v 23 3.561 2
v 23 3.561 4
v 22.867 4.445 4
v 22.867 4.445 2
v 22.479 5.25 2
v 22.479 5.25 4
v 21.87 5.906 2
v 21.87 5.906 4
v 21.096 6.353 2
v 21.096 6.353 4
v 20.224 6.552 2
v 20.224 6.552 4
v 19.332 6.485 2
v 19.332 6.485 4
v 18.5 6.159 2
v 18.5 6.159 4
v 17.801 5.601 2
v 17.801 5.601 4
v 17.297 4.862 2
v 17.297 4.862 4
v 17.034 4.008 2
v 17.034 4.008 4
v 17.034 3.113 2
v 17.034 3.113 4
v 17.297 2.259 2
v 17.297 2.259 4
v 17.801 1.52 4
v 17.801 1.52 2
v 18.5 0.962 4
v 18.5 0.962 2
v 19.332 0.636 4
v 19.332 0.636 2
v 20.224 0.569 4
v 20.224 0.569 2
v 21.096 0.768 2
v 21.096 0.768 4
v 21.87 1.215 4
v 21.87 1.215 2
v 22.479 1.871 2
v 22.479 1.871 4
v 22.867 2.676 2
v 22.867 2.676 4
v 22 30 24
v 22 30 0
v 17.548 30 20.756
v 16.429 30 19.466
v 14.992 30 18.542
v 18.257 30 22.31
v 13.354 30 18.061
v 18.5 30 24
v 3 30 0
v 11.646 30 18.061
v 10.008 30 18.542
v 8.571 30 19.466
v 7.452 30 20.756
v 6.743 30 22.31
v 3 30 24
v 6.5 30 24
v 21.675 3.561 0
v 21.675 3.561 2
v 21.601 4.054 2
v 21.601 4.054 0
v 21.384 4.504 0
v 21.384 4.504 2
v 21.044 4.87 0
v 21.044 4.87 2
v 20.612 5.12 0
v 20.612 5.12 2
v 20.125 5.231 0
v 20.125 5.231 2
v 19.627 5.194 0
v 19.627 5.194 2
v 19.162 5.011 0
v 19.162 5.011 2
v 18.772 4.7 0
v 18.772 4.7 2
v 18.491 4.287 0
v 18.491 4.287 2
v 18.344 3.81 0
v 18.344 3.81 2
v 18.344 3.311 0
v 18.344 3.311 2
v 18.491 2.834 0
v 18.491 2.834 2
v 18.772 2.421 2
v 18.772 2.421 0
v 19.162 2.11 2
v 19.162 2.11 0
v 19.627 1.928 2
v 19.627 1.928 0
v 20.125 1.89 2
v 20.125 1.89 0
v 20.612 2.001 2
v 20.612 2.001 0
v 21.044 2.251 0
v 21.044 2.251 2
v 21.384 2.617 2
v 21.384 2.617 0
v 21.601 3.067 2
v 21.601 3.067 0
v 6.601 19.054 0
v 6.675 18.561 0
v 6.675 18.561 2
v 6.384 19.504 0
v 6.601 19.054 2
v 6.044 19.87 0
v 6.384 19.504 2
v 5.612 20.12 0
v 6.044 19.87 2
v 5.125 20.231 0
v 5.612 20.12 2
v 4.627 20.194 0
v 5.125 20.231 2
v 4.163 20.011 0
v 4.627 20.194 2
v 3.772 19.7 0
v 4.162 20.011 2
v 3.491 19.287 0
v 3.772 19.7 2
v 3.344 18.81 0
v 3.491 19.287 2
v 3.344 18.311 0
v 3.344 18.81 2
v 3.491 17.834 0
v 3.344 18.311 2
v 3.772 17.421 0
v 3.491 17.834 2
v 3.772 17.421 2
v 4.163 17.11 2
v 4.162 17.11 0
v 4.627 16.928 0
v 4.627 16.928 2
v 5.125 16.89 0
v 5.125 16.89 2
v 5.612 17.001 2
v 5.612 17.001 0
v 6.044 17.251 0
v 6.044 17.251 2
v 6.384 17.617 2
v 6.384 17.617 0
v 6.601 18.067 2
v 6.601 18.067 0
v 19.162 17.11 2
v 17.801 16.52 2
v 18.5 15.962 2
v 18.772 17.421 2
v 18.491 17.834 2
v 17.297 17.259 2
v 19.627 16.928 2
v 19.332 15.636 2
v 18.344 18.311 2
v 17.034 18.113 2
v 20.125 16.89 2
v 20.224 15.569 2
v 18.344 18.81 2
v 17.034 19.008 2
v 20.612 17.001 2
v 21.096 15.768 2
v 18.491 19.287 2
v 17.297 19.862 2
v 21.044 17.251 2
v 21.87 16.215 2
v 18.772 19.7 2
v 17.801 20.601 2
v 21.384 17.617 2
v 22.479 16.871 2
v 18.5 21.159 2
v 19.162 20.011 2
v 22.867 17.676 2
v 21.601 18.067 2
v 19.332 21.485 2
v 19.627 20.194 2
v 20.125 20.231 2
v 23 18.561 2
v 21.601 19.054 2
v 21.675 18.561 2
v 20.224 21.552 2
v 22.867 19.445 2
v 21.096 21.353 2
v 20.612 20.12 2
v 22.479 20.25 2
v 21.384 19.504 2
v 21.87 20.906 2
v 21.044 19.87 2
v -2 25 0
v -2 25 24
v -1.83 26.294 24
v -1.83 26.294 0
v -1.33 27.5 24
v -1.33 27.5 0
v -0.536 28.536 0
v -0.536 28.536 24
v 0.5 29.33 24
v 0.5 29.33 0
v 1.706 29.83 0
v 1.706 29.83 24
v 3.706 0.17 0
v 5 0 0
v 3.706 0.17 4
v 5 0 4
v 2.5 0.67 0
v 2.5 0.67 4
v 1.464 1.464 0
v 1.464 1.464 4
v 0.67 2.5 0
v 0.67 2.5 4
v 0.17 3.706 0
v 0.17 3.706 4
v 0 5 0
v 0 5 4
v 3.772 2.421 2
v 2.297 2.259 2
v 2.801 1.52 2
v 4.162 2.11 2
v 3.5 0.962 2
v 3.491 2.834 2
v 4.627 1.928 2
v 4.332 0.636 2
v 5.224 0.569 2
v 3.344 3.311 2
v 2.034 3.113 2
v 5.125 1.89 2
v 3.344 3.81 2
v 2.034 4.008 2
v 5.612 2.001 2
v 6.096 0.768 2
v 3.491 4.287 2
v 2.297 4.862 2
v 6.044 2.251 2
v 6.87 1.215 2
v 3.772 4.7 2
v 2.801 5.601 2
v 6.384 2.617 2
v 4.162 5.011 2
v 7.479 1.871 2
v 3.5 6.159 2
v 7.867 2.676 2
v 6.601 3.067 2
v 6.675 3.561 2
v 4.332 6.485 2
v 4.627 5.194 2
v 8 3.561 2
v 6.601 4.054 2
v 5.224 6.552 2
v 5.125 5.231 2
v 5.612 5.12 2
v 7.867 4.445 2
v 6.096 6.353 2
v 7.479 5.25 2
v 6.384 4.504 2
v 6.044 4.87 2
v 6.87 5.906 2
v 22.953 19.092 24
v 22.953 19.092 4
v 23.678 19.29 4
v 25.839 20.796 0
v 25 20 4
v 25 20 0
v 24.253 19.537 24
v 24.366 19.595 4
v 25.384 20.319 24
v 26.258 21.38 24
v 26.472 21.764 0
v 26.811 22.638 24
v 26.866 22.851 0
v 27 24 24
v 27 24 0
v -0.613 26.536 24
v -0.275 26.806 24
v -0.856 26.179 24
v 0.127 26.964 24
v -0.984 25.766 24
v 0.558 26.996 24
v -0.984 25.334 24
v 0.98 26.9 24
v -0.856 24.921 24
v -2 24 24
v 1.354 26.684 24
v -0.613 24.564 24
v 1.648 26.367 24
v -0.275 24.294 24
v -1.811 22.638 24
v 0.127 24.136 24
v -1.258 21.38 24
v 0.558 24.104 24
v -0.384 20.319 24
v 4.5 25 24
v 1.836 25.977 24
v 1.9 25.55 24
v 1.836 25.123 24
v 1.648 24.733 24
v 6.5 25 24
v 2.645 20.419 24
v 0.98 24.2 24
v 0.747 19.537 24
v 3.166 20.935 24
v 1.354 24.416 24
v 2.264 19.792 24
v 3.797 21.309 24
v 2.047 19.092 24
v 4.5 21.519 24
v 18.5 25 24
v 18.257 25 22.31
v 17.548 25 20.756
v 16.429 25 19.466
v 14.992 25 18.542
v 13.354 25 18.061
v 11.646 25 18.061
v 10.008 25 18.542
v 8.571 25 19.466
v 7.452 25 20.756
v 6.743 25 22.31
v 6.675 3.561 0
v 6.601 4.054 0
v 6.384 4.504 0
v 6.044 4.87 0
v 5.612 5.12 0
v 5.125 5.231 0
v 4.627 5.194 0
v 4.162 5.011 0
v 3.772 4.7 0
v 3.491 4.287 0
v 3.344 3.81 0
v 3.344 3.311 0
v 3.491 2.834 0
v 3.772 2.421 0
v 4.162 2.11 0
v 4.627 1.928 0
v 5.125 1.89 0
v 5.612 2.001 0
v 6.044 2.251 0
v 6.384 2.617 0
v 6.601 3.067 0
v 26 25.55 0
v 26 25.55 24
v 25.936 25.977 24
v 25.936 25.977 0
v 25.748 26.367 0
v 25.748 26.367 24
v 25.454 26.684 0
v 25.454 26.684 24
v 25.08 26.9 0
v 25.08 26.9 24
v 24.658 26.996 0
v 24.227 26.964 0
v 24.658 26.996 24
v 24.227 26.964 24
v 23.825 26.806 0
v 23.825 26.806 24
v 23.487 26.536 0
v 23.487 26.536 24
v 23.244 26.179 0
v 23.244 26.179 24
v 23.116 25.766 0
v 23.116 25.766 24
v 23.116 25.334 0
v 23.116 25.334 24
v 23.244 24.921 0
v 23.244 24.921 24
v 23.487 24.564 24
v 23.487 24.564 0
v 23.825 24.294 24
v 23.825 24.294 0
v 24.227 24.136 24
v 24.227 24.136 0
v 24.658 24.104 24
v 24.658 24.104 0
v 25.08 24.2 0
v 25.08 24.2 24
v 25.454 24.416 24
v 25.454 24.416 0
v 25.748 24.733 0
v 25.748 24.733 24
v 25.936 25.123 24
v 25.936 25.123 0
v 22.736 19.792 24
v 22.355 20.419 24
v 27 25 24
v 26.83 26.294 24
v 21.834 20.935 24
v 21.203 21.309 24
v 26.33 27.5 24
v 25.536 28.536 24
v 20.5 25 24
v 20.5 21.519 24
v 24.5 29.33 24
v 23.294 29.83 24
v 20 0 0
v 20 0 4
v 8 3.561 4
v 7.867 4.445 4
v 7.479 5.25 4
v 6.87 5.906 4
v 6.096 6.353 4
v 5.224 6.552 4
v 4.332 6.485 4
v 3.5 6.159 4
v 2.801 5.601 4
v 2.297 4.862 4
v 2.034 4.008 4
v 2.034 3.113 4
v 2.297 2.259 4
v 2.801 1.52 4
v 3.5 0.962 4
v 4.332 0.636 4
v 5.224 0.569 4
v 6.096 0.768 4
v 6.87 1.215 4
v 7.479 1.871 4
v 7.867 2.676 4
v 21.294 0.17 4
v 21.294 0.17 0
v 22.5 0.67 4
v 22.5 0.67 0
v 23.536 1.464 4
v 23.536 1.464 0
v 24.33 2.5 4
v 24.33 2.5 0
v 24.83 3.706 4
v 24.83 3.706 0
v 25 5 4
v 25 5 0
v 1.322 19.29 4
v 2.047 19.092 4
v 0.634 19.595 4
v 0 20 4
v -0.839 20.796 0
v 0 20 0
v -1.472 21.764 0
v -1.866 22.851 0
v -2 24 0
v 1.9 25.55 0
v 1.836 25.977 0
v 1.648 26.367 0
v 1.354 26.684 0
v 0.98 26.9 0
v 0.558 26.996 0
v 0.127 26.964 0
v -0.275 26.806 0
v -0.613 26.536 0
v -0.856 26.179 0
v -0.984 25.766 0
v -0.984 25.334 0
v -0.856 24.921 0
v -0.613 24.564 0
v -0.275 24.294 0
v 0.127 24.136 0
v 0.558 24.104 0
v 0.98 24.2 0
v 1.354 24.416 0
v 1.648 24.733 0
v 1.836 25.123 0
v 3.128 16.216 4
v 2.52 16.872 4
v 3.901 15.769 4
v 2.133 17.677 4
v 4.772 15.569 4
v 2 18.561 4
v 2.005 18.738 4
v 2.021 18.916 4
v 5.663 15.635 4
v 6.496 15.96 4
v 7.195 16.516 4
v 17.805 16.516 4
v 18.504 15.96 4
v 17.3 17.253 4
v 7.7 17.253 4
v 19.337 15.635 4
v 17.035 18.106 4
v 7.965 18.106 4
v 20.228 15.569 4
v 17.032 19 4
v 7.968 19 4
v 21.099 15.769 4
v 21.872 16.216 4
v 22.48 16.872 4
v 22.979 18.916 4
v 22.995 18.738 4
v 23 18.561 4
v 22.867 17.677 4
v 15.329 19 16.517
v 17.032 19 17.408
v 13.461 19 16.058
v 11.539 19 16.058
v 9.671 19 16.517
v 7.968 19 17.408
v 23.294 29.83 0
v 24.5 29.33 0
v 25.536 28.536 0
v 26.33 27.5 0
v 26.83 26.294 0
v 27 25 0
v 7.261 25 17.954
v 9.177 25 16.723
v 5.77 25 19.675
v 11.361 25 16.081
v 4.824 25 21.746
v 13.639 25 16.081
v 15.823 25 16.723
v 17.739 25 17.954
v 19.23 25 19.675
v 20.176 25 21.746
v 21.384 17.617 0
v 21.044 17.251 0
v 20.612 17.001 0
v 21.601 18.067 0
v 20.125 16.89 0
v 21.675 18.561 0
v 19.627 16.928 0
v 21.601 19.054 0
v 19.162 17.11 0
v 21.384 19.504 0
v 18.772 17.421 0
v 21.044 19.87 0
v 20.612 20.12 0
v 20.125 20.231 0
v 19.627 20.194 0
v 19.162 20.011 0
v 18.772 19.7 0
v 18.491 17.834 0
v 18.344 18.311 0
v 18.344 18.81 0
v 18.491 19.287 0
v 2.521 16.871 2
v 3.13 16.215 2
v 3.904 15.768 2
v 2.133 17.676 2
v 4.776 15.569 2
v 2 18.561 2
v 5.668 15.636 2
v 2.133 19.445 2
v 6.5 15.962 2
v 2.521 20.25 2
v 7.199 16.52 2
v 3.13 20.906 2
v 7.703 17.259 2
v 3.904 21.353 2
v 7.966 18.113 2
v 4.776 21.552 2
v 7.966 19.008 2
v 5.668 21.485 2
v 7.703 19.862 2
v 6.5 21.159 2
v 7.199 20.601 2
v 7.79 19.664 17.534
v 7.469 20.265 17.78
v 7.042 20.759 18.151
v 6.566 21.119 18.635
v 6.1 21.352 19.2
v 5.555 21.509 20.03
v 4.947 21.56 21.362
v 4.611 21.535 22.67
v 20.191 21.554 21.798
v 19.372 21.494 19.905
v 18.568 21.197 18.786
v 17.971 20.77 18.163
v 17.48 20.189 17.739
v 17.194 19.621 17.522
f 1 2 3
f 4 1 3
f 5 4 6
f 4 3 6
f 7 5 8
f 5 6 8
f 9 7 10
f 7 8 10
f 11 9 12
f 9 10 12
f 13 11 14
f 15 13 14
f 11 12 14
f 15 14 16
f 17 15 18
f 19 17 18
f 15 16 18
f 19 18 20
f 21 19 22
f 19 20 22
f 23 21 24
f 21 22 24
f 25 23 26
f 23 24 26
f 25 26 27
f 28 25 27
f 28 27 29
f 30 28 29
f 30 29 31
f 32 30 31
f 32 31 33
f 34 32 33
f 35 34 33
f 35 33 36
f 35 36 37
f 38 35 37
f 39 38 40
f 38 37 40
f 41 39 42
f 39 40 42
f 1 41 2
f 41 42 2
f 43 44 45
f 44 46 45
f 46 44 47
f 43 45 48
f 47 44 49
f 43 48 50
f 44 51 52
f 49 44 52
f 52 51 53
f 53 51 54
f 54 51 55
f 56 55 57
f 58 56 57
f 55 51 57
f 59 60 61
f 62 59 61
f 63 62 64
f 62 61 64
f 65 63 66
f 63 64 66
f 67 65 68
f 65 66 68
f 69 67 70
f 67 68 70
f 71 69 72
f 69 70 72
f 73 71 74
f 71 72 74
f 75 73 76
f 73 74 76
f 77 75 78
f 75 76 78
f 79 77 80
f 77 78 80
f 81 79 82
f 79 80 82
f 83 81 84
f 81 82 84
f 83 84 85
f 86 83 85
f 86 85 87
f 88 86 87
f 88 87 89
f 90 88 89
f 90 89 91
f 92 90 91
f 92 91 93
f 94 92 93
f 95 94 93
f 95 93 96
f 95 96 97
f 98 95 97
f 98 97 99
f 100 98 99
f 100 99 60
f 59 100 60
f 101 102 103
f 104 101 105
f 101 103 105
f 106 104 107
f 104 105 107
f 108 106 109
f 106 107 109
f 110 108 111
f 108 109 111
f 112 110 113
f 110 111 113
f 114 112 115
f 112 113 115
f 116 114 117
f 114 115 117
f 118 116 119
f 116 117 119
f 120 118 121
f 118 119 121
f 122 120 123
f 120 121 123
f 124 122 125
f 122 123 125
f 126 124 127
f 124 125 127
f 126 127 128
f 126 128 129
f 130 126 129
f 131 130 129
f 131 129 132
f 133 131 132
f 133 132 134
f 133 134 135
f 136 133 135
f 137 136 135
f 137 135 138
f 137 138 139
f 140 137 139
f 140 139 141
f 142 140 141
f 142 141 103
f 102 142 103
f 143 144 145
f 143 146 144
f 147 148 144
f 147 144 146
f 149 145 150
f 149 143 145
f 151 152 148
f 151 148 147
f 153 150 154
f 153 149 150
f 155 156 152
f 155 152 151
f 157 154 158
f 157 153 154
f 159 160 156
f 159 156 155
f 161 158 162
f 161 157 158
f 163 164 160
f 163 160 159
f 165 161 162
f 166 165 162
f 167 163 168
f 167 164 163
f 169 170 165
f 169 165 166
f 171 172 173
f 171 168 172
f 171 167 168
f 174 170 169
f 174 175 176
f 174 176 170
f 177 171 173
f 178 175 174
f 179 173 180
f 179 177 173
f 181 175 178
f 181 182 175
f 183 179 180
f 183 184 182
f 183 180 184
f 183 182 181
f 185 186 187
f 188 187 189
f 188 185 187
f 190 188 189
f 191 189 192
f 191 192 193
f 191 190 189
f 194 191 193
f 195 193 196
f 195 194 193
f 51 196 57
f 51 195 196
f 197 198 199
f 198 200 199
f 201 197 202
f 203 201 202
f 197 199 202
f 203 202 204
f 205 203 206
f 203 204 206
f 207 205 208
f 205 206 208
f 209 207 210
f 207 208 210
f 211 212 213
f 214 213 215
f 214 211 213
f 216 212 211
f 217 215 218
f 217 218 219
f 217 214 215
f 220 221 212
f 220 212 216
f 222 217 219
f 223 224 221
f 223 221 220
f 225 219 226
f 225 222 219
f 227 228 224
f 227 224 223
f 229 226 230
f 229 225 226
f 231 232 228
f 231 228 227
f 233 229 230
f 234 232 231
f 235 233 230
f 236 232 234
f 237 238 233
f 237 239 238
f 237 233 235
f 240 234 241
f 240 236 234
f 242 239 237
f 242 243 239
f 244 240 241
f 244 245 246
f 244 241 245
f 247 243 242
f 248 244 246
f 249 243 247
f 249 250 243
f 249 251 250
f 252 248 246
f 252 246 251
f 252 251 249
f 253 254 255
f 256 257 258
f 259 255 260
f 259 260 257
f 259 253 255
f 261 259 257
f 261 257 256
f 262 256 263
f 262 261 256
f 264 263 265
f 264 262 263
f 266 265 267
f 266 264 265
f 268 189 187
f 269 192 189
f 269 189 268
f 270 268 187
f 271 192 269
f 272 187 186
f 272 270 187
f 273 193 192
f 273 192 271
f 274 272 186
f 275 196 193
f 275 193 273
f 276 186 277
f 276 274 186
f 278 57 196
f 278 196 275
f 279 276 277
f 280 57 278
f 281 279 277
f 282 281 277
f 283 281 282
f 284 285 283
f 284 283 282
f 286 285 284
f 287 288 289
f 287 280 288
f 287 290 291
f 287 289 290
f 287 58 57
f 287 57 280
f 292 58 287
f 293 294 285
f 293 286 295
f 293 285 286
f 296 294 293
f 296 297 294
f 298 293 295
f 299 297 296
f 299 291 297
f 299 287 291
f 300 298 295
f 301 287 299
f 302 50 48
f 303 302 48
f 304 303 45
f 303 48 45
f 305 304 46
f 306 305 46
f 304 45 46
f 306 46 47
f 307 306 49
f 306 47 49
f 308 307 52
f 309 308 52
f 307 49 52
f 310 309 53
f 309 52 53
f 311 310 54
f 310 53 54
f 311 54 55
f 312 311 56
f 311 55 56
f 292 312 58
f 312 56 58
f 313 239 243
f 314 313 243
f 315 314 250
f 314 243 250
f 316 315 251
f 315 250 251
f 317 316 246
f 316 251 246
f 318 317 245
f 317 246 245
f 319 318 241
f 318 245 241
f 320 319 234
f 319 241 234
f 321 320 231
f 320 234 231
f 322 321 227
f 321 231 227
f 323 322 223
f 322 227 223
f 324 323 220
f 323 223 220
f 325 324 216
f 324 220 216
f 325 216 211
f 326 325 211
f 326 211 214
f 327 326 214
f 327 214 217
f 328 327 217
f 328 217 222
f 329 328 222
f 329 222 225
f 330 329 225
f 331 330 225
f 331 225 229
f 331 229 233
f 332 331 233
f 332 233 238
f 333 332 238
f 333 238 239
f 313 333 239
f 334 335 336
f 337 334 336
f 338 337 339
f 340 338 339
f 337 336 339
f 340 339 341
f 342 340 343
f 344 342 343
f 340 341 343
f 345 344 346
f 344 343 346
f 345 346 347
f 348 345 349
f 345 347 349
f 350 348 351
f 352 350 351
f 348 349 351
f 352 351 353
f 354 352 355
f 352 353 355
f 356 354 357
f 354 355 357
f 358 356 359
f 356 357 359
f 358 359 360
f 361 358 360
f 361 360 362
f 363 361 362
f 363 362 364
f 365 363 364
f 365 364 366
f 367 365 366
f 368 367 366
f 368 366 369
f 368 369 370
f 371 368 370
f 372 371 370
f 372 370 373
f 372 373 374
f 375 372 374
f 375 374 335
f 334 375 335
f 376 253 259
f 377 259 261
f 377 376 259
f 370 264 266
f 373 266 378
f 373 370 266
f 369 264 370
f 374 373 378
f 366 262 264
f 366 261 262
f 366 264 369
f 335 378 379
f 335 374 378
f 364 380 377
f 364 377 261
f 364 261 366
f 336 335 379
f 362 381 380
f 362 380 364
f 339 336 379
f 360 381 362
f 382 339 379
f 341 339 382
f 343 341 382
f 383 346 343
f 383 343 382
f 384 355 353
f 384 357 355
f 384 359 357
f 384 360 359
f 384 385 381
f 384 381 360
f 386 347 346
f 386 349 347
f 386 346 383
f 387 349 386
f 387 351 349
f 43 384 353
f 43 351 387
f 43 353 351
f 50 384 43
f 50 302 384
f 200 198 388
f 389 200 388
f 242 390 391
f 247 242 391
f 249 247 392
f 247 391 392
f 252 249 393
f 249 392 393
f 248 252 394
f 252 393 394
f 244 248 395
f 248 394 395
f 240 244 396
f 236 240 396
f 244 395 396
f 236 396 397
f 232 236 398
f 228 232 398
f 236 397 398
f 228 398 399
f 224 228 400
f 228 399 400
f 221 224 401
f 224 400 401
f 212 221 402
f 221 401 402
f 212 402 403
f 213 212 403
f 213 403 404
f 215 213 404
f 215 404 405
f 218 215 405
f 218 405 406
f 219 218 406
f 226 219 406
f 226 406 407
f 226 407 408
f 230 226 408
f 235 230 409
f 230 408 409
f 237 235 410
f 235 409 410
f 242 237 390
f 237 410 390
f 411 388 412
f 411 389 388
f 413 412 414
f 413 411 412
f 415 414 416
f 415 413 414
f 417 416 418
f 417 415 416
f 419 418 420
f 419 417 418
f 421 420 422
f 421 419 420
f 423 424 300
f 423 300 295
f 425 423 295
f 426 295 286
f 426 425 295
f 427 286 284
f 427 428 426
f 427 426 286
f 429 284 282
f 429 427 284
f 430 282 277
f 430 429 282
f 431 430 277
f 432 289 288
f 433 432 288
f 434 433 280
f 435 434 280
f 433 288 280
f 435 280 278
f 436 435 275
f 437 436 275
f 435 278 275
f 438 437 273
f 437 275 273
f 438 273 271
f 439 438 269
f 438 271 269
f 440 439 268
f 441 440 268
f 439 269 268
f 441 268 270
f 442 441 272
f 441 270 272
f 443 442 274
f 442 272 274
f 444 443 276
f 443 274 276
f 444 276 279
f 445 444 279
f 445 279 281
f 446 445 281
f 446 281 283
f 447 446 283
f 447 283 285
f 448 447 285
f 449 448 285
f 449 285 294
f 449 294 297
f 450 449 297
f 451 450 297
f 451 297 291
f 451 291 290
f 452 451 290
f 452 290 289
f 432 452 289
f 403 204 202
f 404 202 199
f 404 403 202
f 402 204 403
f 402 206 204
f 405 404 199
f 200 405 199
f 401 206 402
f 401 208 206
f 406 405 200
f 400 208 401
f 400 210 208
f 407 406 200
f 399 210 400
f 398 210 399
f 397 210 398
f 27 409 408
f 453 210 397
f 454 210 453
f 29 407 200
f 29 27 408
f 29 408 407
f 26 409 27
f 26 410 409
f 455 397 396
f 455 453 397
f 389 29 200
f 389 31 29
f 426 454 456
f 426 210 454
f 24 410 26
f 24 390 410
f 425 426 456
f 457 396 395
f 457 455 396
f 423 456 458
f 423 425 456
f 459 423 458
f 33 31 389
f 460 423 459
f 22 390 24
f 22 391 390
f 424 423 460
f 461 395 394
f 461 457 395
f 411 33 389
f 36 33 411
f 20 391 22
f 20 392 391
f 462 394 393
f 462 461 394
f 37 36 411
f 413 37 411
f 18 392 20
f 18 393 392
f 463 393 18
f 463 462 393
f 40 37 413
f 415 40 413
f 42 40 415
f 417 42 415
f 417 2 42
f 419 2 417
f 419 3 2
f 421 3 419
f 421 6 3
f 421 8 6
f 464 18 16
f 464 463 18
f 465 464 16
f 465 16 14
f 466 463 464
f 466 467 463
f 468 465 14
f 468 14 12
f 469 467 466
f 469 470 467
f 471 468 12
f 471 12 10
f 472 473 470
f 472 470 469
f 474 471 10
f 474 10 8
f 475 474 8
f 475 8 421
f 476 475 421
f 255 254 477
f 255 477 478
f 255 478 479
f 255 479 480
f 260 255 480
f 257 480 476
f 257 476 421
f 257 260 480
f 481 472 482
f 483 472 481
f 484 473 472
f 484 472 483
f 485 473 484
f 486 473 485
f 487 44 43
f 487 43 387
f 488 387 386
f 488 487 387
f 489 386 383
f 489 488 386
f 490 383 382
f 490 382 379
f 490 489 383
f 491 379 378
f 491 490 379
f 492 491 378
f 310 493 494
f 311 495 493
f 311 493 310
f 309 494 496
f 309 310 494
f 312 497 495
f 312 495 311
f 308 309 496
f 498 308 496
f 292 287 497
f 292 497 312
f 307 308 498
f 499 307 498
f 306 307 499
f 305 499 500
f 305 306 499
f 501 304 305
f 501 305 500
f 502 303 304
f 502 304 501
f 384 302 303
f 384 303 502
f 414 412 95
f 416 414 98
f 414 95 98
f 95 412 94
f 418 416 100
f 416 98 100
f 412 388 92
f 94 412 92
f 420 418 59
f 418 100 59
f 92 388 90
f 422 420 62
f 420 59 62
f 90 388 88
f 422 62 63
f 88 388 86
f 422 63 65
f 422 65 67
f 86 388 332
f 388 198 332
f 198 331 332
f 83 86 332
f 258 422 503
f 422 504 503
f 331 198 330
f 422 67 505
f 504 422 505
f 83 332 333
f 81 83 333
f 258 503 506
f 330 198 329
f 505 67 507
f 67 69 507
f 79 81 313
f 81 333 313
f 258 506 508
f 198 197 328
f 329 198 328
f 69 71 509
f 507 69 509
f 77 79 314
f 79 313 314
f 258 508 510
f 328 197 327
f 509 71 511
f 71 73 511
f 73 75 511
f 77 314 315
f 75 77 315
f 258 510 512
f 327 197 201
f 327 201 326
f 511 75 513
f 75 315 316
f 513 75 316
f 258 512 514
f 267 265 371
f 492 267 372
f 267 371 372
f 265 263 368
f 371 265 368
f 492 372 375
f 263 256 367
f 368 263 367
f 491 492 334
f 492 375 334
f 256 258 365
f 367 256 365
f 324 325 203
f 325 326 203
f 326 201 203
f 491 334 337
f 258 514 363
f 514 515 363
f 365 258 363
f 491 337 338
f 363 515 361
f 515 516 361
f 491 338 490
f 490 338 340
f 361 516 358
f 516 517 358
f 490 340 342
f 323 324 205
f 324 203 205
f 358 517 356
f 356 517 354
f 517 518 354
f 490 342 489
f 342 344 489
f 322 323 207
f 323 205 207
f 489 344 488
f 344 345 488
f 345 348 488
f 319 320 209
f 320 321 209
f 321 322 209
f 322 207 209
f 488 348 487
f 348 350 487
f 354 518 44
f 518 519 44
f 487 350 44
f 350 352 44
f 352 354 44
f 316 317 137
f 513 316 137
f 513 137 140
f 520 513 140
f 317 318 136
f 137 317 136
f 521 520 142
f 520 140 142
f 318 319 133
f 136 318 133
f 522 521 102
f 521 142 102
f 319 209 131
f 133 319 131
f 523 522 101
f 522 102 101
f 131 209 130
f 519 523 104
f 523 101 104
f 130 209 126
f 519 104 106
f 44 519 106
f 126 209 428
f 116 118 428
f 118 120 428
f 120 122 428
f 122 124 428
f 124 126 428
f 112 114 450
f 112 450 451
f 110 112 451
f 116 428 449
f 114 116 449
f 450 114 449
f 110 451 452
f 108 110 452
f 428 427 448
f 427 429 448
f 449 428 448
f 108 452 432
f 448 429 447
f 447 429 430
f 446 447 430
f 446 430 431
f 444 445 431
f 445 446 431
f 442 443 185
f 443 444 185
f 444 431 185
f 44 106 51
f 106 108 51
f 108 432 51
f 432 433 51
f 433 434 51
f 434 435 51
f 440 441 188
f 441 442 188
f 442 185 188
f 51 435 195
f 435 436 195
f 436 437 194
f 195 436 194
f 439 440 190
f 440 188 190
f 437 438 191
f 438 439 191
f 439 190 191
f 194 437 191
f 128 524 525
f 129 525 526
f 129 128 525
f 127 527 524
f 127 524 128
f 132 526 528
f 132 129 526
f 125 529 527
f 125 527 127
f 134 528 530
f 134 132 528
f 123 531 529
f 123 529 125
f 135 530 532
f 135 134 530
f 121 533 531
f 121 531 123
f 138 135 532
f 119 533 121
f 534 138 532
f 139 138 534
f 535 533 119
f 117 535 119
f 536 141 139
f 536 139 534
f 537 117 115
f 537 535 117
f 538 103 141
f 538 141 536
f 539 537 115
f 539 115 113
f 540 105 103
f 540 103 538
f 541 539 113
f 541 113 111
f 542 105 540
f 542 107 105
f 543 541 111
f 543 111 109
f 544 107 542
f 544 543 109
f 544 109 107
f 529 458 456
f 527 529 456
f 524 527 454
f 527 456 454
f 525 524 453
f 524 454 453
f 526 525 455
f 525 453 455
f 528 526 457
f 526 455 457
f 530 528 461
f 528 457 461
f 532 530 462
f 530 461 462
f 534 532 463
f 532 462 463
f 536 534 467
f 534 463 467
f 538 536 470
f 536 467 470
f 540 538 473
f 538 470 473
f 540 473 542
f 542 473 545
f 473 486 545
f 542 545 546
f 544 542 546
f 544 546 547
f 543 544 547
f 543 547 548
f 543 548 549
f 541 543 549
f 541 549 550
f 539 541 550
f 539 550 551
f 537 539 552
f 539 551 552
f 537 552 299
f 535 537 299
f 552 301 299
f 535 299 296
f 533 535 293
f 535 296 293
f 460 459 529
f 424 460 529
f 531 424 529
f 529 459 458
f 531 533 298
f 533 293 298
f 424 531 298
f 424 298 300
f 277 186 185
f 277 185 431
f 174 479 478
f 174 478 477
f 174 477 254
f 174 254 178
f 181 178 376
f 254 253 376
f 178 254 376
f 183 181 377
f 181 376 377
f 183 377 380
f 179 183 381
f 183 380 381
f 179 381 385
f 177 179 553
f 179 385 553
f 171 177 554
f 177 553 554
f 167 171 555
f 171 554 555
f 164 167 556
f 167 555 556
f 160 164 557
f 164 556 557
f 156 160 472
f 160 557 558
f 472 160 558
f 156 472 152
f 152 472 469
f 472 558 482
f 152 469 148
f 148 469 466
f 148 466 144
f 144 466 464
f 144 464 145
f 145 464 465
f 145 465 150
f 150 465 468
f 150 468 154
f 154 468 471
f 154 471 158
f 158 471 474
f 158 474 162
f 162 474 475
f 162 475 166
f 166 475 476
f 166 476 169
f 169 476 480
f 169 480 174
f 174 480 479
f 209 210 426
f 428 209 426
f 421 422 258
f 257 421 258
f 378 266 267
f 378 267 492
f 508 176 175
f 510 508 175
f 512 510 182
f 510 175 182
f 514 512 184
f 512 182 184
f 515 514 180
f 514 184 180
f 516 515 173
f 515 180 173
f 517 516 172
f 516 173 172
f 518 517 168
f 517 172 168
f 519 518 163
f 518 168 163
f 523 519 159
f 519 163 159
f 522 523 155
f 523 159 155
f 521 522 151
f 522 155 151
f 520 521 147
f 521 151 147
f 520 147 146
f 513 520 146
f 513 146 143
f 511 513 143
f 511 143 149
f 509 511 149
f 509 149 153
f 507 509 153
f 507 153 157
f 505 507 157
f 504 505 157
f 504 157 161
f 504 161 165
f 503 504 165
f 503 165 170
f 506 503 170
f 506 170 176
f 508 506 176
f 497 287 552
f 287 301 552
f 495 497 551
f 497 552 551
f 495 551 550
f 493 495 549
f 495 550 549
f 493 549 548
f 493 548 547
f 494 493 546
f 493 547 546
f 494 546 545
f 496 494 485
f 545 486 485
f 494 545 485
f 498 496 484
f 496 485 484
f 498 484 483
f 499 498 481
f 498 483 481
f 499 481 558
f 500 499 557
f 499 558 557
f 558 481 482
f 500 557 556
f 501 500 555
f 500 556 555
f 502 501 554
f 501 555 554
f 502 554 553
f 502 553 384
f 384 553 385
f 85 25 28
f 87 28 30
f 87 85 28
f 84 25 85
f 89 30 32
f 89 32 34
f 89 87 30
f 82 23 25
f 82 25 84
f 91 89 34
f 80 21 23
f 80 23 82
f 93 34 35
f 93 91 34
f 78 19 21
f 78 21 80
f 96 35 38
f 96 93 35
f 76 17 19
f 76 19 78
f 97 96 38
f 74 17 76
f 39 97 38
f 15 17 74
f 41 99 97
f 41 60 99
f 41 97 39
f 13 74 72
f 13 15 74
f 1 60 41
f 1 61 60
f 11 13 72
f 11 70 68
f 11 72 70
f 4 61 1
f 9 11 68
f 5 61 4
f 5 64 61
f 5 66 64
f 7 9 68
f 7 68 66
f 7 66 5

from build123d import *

# Parameters (mm, degrees)
F0_W          = 25
F0_H          = 30
F1_DEPTH      = 4
F2_R          = 1.675
F3_DEPTH      = 25
F4_W          = 25
F4_H          = 11
F5_DEPTH      = 20
F7_DEPTH      = 6
F8_R          = 8
F9_DEPTH      = 6
F2_R_2        = 3
F10_DEPTH     = 2
F11_W         = 11
F11_H         = 24
F12_DEPTH     = 2
F13_R         = 5
F14_W         = 11
F14_H         = 24
F15_DEPTH     = 2
F16_DEPTH     = 2
F17_R         = 1.45
F18_DEPTH     = 25
F19_T1_DEPTH  = 49
F19_T6_DEPTH  = 49
F19_T11_DEPTH = 49
F19_T16_DEPTH = 49
F19_T21_DEPTH = 49
F20_DEPTH     = 25


# Not quite as in the source:
# - a fillet or chamfer that OpenCascade refuses, or shapes differently, is made with other operations: its cross-section is extruded or revolved along the edge and cut away or added


with BuildPart() as f1:
    # F0 (on Top) → F1 (new body)
    with BuildSketch(Plane.XY):
        with Locations((12.5, 15)):
            Rectangle(F0_W, F0_H)
    extrude(amount=F1_DEPTH)

    # F2 (on face) → F3 (cut)
    with BuildSketch(Plane.XY.offset(4)):
        with BuildLine():
            ThreePointArc((3.325, 18.5605346784), (5, 16.8855346784), (6.675, 18.5605346784))
            ThreePointArc((6.675, 18.5605346784), (5, 20.2355346784), (3.325, 18.5605346784))
        make_face()
        with Locations((20, 18.5605346784)):
            Circle(F2_R)
        with Locations((20, 3.5605346784)):
            Circle(F2_R)
        with Locations((5, 3.5605346784)):
            Circle(F2_R)
    extrude(amount=-F3_DEPTH, mode=Mode.SUBTRACT)

    # F4 (on face) → F5 (join)
    with BuildSketch(Plane.XY.offset(4)):
        with Locations((12.5, 24.5)):
            Rectangle(F4_W, F4_H)
    extrude(amount=F5_DEPTH)

    # F6 (on face) → F7 (cut)
    with BuildSketch(Plane(origin=(0, 30, 0), x_dir=(-1, 0, 0), z_dir=(0, 1, 0))):
        with BuildLine():
            ThreePointArc((-18.5, 24), (-12.5, 18), (-6.5, 24))
            Line((-6.5, 24), (-18.5, 24))
        make_face()
    extrude(amount=-F7_DEPTH, mode=Mode.SUBTRACT)

    # F8 (on face) → F9 (cut)
    with BuildSketch(Plane.XZ.offset(-19)):
        with Locations((12.5, 24)):
            Circle(F8_R)
    extrude(amount=-F9_DEPTH, mode=Mode.SUBTRACT)

    # F2 (on face) → F10 (cut)
    with BuildSketch(Plane.XY.offset(4)):
        with BuildLine():
            ThreePointArc((8, 18.5605346784), (5, 21.5605346784), (2, 18.5605346784))
            ThreePointArc((2, 18.5605346784), (5, 15.5605346784), (8, 18.5605346784))
        make_face()
        with BuildLine():
            ThreePointArc((3.325, 18.5605346784), (5, 20.2355346784), (6.675, 18.5605346784))
            ThreePointArc((6.675, 18.5605346784), (5, 16.8855346784), (3.325, 18.5605346784))
        make_face(mode=Mode.SUBTRACT)
        with Locations((20, 18.5605346784)):
            Circle(F2_R_2)
        with Locations((20, 18.5605346784)):
            Circle(F2_R, mode=Mode.SUBTRACT)
        with Locations((20, 3.5605346784)):
            Circle(F2_R_2)
        with Locations((20, 3.5605346784)):
            Circle(F2_R, mode=Mode.SUBTRACT)
        with Locations((5, 3.5605346784)):
            Circle(F2_R_2)
        with Locations((5, 3.5605346784)):
            Circle(F2_R, mode=Mode.SUBTRACT)
    extrude(amount=-F10_DEPTH, mode=Mode.SUBTRACT)

    # F11 (on face) → F12 (join)
    with BuildSketch(Plane(origin=(0, 0, 0), x_dir=(0, -1, 0), z_dir=(-1, 0, 0))):
        with Locations((-24.5, 12)):
            Rectangle(F11_W, F11_H)
    extrude(amount=F12_DEPTH)

    # F13
    f13_edges = [f1.edges().sort_by_distance(p)[0] for p in [
        (0, 0, 2),
        (25, 0, 2),
    ]]
    fillet(f13_edges, radius=F13_R)

    # F14 (on face) → F15 (join)
    with BuildSketch(Plane.YZ.offset(25)):
        with Locations((24.5, 12)):
            Rectangle(F14_W, F14_H)
    extrude(amount=F15_DEPTH)

    # F14 (on face) → F16 (join)
    with BuildSketch(Plane.YZ.offset(25)):
        with Locations((24.5, 12)):
            Rectangle(F14_W, F14_H)
    extrude(amount=F16_DEPTH)

    # F17 (on face) → F18 (cut)
    with BuildSketch(Plane.XY.offset(24)):
        with Locations((0.45, 25.55)):
            Circle(F17_R)
        with Locations((24.55, 25.55)):
            Circle(F17_R)
    extrude(amount=-F18_DEPTH, mode=Mode.SUBTRACT)

    # F19: fillet of radius 5 on 4 edges, made by hand

    # F19_s2 → F19_t1 (cut)
    with BuildSketch(Plane.XY.offset(-12.5)):
        with BuildLine():
            ThreePointArc((-2, 25), (-0.5355339059, 28.5355339059), (3, 30))
            Line((3, 30), (-2, 30))
            Line((-2, 30), (-2, 25))
        make_face()
        with BuildLine():
            ThreePointArc((22, 30), (25.5355339059, 28.5355339059), (27, 25))
            Line((27, 25), (27, 30))
            Line((27, 30), (22, 30))
        make_face()
    extrude(amount=F19_T1_DEPTH, mode=Mode.SUBTRACT)


with BuildPart() as f19_tool4:
    # F19_s5 → F19_t6 (new body)
    with BuildSketch(Plane.XY.offset(-12.5)):
        with BuildLine():
            ThreePointArc((3, 19), (-0.5355339059, 20.4644660941), (-2, 24))
            Line((-2, 24), (-2, 19))
            Line((-2, 19), (3, 19))
        make_face()
    extrude(amount=F19_T6_DEPTH)

    split(bisect_by=Plane.YZ, keep=Keep.BOTTOM)


with BuildPart() as f1_1:
    add(f1.part)

    # F19_t3: cut F19_tool4
    add(f19_tool4.part, mode=Mode.SUBTRACT)


with BuildPart() as f19_tool9:
    # F19_s10 → F19_t11 (new body)
    with BuildSketch(Plane.XY.offset(-12.5)):
        with BuildLine():
            ThreePointArc((3, 19), (-0.5355339059, 20.4644660941), (-2, 24))
            Line((-2, 24), (-2, 19))
            Line((-2, 19), (3, 19))
        make_face()
    extrude(amount=F19_T11_DEPTH)

    split(bisect_by=Plane.XY.offset(4), keep=Keep.TOP)


with BuildPart() as f1_2:
    add(f1_1.part)

    # F19_t8: cut F19_tool9
    add(f19_tool9.part, mode=Mode.SUBTRACT)


with BuildPart() as f19_tool14:
    # F19_s15 → F19_t16 (new body)
    with BuildSketch(Plane.XY.offset(36.5)):
        with BuildLine():
            ThreePointArc((22, 19), (25.5355339059, 20.4644660941), (27, 24))
            Line((27, 24), (27, 19))
            Line((27, 19), (22, 19))
        make_face()
    extrude(amount=-F19_T16_DEPTH)

    split(bisect_by=Plane.XY.offset(4), keep=Keep.TOP)


with BuildPart() as f1_3:
    add(f1_2.part)

    # F19_t13: cut F19_tool14
    add(f19_tool14.part, mode=Mode.SUBTRACT)


with BuildPart() as f19_tool19:
    # F19_s20 → F19_t21 (new body)
    with BuildSketch(Plane.XY.offset(36.5)):
        with BuildLine():
            ThreePointArc((22, 19), (25.5355339059, 20.4644660941), (27, 24))
            Line((27, 24), (27, 19))
            Line((27, 19), (22, 19))
        make_face()
    extrude(amount=-F19_T21_DEPTH)

    split(bisect_by=Plane.YZ.offset(25), keep=Keep.TOP)


with BuildPart() as f1_4:
    add(f1_3.part)

    # F19_t18: cut F19_tool19
    add(f19_tool19.part, mode=Mode.SUBTRACT)

    # F2 (on face) → F20 (cut)
    with BuildSketch(Plane.XY.offset(4)):
        with BuildLine():
            ThreePointArc((8, 18.5605346784), (5, 21.5605346784), (2, 18.5605346784))
            ThreePointArc((2, 18.5605346784), (5, 15.5605346784), (8, 18.5605346784))
        make_face()
        with BuildLine():
            ThreePointArc((3.325, 18.5605346784), (5, 20.2355346784), (6.675, 18.5605346784))
            ThreePointArc((6.675, 18.5605346784), (5, 16.8855346784), (3.325, 18.5605346784))
        make_face(mode=Mode.SUBTRACT)
        with Locations((20, 18.5605346784)):
            Circle(F2_R_2)
        with Locations((20, 18.5605346784)):
            Circle(F2_R, mode=Mode.SUBTRACT)
        with BuildLine():
            ThreePointArc((3.325, 18.5605346784), (5, 16.8855346784), (6.675, 18.5605346784))
            ThreePointArc((6.675, 18.5605346784), (5, 20.2355346784), (3.325, 18.5605346784))
        make_face()
        with Locations((20, 18.5605346784)):
            Circle(F2_R)
    extrude(amount=F20_DEPTH, mode=Mode.SUBTRACT)


solid = f1_4.part
